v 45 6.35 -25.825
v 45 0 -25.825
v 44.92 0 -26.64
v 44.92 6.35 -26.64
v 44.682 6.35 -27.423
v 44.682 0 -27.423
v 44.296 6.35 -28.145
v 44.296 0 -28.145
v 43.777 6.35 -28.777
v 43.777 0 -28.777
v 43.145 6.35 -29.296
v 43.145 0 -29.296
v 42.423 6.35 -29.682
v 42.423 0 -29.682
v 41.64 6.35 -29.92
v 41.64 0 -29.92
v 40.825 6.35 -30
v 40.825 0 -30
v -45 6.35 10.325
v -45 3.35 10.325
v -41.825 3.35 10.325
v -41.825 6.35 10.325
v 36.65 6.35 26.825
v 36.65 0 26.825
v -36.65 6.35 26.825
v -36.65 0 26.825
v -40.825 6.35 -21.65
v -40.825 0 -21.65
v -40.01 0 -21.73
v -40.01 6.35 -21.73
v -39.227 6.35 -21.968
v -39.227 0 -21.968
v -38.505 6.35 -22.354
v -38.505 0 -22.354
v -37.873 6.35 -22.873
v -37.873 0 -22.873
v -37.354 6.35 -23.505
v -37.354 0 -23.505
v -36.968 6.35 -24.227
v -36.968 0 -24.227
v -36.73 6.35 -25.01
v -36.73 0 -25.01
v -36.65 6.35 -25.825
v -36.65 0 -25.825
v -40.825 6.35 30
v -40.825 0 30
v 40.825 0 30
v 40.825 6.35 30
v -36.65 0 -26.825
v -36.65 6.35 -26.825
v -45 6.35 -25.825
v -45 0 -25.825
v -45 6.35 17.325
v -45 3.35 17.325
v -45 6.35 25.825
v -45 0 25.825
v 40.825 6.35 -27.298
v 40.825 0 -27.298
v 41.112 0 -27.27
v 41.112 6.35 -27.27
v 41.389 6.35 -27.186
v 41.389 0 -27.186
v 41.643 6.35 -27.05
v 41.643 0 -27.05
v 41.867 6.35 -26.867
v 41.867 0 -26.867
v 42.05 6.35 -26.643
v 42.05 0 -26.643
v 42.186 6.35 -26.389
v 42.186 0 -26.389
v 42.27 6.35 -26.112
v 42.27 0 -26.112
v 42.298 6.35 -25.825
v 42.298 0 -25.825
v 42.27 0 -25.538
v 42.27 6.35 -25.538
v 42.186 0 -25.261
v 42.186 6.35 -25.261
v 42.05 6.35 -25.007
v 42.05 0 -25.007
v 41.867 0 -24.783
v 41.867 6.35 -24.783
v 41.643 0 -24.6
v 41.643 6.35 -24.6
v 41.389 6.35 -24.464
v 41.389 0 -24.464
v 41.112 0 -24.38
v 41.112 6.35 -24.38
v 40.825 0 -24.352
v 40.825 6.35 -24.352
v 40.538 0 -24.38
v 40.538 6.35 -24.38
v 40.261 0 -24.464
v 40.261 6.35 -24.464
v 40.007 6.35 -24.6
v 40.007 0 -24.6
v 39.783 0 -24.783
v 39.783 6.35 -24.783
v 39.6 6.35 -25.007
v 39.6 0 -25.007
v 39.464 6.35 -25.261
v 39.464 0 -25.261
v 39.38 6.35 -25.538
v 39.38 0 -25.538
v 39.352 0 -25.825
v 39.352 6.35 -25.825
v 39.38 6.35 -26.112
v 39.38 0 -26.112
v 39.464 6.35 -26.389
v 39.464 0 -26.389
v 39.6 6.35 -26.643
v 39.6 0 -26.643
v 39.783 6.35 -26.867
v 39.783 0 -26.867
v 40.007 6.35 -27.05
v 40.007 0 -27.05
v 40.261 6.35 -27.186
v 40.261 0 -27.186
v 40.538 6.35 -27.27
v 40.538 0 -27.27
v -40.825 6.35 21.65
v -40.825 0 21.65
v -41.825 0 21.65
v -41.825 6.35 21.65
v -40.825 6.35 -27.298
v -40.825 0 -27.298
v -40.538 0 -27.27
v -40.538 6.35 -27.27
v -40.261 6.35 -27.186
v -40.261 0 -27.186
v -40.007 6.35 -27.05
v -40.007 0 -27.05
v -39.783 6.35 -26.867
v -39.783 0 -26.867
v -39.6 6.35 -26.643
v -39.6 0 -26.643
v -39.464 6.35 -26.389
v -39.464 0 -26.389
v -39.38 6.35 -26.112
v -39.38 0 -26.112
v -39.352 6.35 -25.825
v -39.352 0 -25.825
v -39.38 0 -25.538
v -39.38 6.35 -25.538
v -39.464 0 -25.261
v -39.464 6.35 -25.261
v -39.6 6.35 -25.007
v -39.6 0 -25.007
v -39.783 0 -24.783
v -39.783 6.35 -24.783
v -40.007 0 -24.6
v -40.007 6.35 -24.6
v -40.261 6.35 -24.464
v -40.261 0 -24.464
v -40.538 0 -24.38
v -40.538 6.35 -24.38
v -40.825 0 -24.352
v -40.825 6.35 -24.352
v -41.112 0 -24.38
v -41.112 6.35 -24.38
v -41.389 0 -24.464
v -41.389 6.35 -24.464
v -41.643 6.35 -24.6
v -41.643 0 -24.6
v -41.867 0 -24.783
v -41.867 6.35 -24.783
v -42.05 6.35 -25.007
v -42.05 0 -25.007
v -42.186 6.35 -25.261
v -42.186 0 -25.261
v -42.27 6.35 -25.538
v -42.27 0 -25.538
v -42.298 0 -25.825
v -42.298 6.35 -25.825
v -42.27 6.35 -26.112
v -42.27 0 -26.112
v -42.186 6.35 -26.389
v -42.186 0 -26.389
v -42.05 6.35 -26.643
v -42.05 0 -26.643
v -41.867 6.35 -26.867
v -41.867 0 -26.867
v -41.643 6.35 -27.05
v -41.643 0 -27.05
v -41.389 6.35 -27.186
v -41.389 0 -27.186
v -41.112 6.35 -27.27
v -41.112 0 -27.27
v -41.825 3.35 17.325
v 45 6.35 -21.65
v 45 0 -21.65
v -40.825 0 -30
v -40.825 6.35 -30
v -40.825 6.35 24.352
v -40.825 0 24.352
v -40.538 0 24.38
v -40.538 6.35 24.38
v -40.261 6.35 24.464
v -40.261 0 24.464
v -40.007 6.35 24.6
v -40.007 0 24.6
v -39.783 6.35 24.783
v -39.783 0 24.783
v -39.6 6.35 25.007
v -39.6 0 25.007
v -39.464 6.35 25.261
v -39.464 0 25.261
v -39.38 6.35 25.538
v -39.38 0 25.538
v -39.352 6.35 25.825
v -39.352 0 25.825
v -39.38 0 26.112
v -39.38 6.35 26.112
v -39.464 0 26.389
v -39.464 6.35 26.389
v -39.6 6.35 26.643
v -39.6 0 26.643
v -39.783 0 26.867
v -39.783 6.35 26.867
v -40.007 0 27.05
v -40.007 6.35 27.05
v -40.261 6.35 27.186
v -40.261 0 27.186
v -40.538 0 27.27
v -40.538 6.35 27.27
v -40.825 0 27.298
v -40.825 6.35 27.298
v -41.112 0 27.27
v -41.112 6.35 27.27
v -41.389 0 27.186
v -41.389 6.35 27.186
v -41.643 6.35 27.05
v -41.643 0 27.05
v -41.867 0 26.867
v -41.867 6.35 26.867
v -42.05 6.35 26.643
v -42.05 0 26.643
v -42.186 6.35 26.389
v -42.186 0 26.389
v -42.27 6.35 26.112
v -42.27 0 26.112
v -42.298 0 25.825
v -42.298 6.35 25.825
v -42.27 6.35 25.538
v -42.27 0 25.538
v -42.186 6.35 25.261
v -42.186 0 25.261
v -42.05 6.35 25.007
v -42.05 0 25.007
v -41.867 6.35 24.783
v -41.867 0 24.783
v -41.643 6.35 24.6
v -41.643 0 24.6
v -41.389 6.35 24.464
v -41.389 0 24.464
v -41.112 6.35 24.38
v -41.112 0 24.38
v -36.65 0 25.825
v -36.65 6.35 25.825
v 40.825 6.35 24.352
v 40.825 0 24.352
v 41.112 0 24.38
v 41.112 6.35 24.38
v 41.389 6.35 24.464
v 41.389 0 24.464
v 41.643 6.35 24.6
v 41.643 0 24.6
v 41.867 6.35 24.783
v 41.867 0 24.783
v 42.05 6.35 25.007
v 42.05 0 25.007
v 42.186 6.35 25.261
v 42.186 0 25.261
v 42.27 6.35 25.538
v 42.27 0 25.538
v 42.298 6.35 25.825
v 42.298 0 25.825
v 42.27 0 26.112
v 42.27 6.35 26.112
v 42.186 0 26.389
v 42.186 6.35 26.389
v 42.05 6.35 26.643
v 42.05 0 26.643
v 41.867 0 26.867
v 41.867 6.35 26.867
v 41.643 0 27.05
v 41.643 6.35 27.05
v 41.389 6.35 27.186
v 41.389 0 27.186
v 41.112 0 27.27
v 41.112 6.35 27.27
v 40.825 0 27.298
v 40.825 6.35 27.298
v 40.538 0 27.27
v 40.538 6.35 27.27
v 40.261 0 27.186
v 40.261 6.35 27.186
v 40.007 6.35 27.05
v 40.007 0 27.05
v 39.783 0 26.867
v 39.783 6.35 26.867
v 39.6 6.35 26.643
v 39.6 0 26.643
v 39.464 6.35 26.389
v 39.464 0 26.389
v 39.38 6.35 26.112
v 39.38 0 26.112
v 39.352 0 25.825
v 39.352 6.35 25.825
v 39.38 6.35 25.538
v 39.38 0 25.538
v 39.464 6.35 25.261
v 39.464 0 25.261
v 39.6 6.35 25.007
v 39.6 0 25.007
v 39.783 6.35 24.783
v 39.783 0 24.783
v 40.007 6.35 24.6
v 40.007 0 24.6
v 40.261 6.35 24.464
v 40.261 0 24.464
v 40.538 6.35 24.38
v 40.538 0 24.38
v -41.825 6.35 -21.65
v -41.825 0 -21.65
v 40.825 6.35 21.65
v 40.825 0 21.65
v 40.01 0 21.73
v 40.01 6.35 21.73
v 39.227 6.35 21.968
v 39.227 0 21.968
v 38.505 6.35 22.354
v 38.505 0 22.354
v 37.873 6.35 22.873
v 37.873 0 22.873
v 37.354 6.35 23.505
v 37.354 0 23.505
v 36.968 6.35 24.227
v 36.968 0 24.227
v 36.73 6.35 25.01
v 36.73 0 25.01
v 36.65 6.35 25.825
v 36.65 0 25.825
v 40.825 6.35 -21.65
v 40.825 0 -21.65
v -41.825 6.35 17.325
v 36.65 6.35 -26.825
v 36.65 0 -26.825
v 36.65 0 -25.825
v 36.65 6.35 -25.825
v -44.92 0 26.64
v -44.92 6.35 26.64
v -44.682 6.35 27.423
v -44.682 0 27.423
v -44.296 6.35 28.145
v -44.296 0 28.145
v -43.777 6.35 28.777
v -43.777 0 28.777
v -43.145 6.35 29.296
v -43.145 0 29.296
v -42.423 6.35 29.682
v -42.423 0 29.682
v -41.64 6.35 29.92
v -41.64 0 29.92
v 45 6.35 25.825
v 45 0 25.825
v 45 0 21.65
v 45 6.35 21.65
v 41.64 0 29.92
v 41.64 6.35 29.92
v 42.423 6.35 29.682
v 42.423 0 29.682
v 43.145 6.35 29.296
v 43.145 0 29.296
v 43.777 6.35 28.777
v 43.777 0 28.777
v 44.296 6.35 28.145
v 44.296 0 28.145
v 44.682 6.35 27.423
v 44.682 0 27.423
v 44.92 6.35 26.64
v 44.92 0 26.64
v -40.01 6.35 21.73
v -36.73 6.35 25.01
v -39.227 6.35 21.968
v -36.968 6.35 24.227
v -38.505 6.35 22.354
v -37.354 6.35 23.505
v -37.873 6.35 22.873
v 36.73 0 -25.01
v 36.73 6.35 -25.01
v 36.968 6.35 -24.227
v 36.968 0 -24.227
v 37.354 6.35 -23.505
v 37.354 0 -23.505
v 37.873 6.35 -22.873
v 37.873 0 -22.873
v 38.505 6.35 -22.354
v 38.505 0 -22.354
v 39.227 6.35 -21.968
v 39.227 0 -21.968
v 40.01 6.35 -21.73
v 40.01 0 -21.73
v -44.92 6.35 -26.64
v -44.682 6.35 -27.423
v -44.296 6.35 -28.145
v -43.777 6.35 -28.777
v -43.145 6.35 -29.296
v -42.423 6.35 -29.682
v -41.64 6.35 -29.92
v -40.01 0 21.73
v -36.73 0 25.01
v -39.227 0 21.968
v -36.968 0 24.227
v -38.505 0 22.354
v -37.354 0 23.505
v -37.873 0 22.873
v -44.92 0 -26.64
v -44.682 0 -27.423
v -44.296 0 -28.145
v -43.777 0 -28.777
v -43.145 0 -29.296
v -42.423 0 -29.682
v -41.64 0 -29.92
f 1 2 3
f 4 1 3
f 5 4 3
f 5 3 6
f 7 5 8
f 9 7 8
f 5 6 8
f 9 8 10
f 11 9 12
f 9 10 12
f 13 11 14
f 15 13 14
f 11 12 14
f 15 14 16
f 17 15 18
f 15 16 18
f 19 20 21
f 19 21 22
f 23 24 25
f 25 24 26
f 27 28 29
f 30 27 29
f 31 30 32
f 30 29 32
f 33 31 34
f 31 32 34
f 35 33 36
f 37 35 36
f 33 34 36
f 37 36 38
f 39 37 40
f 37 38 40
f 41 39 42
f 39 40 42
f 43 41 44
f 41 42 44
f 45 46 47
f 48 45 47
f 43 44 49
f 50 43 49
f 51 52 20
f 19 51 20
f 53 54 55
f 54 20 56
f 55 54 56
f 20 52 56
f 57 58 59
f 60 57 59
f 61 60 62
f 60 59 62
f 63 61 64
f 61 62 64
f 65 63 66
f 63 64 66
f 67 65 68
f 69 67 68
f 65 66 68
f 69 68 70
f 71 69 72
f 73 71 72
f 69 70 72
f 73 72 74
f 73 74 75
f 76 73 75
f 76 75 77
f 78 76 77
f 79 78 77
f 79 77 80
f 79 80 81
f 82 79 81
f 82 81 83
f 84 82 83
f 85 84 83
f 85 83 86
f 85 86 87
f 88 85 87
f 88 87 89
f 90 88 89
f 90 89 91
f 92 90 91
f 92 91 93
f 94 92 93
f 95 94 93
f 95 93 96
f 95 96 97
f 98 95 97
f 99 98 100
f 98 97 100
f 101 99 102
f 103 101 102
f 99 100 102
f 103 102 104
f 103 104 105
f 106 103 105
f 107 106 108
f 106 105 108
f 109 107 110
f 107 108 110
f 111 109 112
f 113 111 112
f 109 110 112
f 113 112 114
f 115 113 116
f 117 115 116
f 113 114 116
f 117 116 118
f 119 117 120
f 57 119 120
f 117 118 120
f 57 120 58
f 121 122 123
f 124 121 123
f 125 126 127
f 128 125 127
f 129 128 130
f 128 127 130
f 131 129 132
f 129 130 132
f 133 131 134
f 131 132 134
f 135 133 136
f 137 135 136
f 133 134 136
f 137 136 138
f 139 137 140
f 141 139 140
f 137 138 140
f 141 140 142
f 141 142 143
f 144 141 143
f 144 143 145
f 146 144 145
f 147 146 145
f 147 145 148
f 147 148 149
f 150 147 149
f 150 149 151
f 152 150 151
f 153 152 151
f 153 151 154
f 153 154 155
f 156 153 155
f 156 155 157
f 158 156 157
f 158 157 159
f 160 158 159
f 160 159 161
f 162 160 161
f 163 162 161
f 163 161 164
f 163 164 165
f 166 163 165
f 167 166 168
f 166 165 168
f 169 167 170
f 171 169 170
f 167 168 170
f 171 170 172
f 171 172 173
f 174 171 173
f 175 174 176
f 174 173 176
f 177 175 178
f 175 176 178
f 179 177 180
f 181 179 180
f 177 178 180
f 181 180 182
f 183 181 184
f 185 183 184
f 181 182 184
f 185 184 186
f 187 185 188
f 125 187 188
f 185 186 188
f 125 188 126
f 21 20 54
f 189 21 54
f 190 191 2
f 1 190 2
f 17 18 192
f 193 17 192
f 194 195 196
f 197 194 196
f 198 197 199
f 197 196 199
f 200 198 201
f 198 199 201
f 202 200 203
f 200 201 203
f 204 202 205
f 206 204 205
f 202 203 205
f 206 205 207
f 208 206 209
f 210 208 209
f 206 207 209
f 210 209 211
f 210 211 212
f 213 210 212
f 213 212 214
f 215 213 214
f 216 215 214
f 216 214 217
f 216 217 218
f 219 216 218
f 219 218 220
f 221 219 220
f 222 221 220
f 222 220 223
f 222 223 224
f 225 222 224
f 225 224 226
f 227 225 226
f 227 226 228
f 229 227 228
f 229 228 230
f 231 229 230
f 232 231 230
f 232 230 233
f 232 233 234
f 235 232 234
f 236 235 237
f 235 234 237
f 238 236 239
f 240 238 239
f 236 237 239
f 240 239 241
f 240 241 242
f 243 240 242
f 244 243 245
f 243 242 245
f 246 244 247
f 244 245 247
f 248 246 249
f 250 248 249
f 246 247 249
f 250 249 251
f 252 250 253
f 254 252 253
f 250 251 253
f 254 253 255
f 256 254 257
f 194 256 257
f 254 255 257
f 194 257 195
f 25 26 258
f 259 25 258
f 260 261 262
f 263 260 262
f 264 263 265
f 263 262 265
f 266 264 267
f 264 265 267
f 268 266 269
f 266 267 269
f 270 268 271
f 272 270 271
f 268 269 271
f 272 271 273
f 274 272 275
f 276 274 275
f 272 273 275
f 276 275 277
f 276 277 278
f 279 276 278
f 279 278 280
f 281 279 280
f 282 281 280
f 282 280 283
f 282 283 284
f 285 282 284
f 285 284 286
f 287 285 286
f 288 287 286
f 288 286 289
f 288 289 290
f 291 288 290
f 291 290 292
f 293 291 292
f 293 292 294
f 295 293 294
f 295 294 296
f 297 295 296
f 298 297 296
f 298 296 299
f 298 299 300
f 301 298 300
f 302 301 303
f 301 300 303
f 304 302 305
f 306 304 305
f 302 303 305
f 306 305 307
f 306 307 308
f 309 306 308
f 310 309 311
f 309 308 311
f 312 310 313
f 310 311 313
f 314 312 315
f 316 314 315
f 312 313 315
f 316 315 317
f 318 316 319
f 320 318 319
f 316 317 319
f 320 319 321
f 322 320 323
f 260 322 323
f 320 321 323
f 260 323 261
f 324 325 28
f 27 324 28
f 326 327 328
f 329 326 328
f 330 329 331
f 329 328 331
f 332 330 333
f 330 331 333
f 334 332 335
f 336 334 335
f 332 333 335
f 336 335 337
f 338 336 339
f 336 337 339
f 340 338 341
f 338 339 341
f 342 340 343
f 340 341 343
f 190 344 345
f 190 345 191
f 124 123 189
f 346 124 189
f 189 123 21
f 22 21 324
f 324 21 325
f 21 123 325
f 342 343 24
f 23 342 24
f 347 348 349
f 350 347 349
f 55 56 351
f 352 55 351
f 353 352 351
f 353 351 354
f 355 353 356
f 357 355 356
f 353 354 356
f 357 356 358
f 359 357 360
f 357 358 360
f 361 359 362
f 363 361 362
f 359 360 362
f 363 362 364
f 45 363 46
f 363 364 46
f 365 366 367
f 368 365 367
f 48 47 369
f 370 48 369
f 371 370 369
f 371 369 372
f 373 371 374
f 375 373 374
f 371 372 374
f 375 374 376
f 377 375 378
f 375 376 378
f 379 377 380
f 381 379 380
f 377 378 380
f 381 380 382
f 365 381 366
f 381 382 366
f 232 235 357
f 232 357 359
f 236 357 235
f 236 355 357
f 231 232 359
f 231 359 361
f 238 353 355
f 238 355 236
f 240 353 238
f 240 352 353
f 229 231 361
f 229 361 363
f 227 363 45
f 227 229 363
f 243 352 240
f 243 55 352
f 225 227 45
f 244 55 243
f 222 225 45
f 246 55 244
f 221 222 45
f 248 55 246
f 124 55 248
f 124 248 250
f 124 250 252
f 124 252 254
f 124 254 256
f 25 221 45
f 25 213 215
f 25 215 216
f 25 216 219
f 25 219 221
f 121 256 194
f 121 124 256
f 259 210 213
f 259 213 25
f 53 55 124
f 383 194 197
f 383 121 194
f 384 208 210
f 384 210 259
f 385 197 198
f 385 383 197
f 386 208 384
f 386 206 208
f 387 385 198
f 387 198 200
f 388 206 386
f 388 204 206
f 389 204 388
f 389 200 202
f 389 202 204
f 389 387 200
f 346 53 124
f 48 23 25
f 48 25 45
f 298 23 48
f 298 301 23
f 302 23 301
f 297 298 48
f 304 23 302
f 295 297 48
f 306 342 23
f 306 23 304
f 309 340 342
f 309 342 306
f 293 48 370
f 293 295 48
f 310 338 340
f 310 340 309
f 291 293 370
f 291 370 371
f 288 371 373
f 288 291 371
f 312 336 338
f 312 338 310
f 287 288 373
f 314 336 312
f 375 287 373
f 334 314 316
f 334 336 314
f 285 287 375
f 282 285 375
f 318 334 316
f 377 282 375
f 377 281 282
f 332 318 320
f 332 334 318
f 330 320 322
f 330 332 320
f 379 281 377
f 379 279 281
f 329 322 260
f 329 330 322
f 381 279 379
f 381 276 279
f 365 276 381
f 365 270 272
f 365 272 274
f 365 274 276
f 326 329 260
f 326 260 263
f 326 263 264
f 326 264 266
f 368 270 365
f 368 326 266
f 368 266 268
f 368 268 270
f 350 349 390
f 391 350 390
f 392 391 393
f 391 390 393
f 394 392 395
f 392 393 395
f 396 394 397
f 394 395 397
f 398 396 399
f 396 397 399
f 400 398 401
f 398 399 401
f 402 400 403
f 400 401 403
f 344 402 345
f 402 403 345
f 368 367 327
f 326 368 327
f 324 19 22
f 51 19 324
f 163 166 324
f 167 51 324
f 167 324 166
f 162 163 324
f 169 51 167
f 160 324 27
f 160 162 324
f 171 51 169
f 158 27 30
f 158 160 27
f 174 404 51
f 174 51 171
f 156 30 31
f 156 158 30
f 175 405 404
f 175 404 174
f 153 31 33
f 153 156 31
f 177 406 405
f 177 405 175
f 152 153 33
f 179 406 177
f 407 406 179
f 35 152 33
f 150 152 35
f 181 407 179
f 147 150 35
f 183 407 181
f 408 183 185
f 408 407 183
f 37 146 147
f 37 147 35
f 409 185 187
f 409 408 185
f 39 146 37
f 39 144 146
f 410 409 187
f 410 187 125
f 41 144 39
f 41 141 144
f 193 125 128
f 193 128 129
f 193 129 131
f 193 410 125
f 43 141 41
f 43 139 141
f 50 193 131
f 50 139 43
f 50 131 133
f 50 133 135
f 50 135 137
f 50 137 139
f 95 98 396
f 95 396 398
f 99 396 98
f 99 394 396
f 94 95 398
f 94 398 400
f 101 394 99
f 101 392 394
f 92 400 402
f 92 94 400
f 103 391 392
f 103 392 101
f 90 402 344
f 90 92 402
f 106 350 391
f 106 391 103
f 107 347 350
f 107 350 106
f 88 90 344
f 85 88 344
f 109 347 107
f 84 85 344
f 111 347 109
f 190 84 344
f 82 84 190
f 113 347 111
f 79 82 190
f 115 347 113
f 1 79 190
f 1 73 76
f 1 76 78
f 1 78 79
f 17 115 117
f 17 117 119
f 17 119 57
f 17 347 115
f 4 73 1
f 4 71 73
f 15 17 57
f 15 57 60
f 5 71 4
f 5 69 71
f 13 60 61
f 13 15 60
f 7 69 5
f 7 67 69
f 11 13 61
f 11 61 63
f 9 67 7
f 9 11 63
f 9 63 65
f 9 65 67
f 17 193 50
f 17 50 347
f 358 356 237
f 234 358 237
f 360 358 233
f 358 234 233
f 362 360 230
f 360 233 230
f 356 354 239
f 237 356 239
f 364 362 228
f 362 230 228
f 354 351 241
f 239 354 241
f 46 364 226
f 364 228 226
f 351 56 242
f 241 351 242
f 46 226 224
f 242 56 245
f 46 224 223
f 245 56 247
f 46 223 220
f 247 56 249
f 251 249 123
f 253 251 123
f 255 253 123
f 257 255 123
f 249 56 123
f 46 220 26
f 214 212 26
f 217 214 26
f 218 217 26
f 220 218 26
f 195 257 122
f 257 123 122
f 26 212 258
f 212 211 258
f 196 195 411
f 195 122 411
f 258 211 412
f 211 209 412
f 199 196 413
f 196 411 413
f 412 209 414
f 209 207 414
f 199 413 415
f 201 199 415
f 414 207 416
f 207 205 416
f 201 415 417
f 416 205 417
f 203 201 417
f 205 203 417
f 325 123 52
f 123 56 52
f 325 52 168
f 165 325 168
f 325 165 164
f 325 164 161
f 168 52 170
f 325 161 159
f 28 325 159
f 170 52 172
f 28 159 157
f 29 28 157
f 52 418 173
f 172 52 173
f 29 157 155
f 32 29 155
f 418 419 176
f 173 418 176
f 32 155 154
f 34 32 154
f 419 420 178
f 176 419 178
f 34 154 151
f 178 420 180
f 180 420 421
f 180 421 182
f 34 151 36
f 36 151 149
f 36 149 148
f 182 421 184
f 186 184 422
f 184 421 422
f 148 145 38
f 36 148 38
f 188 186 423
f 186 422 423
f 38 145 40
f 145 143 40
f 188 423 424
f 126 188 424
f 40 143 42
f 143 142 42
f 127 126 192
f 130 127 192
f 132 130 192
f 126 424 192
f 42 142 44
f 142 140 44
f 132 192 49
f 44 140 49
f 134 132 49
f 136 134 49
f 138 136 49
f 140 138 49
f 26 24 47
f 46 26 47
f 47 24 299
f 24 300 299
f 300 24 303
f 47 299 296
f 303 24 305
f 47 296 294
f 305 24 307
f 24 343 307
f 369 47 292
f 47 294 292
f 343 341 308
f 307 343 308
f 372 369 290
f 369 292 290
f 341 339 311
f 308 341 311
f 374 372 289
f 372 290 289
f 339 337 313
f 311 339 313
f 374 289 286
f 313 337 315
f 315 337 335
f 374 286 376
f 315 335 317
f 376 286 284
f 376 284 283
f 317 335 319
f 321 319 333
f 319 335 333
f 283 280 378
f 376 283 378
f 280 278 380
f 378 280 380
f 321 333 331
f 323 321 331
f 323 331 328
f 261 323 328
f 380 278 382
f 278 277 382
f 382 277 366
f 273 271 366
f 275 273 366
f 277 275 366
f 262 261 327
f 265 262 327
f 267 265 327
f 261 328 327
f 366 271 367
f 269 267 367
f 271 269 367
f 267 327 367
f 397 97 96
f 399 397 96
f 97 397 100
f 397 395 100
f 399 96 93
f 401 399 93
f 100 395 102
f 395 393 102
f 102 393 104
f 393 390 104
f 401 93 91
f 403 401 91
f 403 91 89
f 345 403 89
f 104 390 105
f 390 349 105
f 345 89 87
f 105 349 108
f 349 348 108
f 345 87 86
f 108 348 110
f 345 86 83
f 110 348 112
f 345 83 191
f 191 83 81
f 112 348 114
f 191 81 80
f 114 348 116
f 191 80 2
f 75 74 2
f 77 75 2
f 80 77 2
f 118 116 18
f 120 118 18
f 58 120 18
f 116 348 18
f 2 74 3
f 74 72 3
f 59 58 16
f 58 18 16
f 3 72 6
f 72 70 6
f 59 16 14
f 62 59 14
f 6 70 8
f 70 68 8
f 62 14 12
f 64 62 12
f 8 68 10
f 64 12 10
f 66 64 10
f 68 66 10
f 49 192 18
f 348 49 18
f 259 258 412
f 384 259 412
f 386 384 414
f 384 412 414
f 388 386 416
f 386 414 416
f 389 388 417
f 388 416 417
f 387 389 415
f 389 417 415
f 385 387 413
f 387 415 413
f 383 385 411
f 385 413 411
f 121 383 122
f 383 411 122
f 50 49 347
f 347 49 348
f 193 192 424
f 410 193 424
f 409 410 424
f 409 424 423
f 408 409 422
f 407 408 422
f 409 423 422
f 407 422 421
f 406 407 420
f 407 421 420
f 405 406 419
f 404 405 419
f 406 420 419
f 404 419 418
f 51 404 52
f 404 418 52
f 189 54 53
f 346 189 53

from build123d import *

# Parameters (mm, degrees)
BOSS_EXTRUDE3_DEPTH = 6.35
ANTENNA_HOLE_SIZE_W = 7
ANTENNA_HOLE_SIZE_H = 6
CUT_EXTRUDE3_DEPTH  = 3.175
SKETCH7_R           = 1.4732
CUT_EXTRUDE4_DEPTH  = 10
SKETCH8_W           = 3.175
SKETCH8_H           = 43.3
CUT_EXTRUDE5_DEPTH  = 55.454774814


with BuildPart() as part:
    # Sketch2 → Boss-Extrude3 (new body)
    with BuildSketch(Plane(origin=(0, 0, 0), x_dir=(1, 0, 0), z_dir=(0, 1, 0))):
        with BuildLine():
            Line((-45, 25.825), (-45, -25.825))
            ThreePointArc((-45, -25.825), (-43.777170811, -28.777170811), (-40.825, -30))
            Line((-40.825, -30), (40.825, -30))
            ThreePointArc((40.825, -30), (43.777170811, -28.777170811), (45, -25.825))
            Line((45, -25.825), (45, 25.825))
            ThreePointArc((45, 25.825), (43.777170811, 28.777170811), (40.825, 30))
            Line((40.825, 30), (-40.825, 30))
            ThreePointArc((-40.825, 30), (-43.777170811, 28.777170811), (-45, 25.825))
        make_face()
        with BuildLine():
            Line((40.825, 21.65), (41.825, 21.65))
            Line((41.825, 21.65), (41.825, -21.65))
            Line((41.825, -21.65), (40.825, -21.65))
            ThreePointArc((40.825, -21.65), (37.872829189, -22.872829189), (36.65, -25.825))
            Line((36.65, -25.825), (36.65, -26.825))
            Line((36.65, -26.825), (-36.65, -26.825))
            Line((-36.65, -26.825), (-36.65, -25.825))
            ThreePointArc((-36.65, -25.825), (-37.872829189, -22.872829189), (-40.825, -21.65))
            Line((-40.825, -21.65), (-41.825, -21.65))
            Line((-41.825, -21.65), (-41.825, 21.65))
            Line((-41.825, 21.65), (-40.825, 21.65))
            ThreePointArc((-40.825, 21.65), (-37.872829189, 22.872829189), (-36.65, 25.825))
            Line((-36.65, 25.825), (-36.65, 26.825))
            Line((-36.65, 26.825), (36.65, 26.825))
            Line((36.65, 26.825), (36.65, 25.825))
            ThreePointArc((36.65, 25.825), (37.872829189, 22.872829189), (40.825, 21.65))
        make_face(mode=Mode.SUBTRACT)
    extrude(amount=BOSS_EXTRUDE3_DEPTH)

    # Antenna Hole Size → Cut-Extrude3 (cut)
    with BuildSketch(Plane.ZY.offset(45)):
        with Locations((13.825, 6.35)):
            Rectangle(ANTENNA_HOLE_SIZE_W, ANTENNA_HOLE_SIZE_H)
    extrude(amount=-CUT_EXTRUDE3_DEPTH, mode=Mode.SUBTRACT)

    # Sketch7 → Cut-Extrude4 (cut)
    with BuildSketch(Plane.XZ):
        with Locations(Location((-40.825, -25.825, 0), (0, 0, 270))):
            Circle(SKETCH7_R)
        with Locations(Location((-40.825, 25.825, 0), (0, 0, 270))):
            Circle(SKETCH7_R)
        with Locations(Location((40.825, 25.825, 0), (0, 0, 270))):
            Circle(SKETCH7_R)
        with Locations(Location((40.825, -25.825, 0), (0, 0, 270))):
            Circle(SKETCH7_R)
    extrude(amount=-CUT_EXTRUDE4_DEPTH, mode=Mode.SUBTRACT)

    # Sketch8 → Cut-Extrude5 (cut, through all)
    with BuildSketch(Plane(origin=(0, 6.35, 0), x_dir=(1, 0, 0), z_dir=(0, 1, 0))):
        with Locations((43.4125, 0)):
            Rectangle(SKETCH8_W, SKETCH8_H)
    extrude(amount=-CUT_EXTRUDE5_DEPTH, mode=Mode.SUBTRACT)


solid = part.part
